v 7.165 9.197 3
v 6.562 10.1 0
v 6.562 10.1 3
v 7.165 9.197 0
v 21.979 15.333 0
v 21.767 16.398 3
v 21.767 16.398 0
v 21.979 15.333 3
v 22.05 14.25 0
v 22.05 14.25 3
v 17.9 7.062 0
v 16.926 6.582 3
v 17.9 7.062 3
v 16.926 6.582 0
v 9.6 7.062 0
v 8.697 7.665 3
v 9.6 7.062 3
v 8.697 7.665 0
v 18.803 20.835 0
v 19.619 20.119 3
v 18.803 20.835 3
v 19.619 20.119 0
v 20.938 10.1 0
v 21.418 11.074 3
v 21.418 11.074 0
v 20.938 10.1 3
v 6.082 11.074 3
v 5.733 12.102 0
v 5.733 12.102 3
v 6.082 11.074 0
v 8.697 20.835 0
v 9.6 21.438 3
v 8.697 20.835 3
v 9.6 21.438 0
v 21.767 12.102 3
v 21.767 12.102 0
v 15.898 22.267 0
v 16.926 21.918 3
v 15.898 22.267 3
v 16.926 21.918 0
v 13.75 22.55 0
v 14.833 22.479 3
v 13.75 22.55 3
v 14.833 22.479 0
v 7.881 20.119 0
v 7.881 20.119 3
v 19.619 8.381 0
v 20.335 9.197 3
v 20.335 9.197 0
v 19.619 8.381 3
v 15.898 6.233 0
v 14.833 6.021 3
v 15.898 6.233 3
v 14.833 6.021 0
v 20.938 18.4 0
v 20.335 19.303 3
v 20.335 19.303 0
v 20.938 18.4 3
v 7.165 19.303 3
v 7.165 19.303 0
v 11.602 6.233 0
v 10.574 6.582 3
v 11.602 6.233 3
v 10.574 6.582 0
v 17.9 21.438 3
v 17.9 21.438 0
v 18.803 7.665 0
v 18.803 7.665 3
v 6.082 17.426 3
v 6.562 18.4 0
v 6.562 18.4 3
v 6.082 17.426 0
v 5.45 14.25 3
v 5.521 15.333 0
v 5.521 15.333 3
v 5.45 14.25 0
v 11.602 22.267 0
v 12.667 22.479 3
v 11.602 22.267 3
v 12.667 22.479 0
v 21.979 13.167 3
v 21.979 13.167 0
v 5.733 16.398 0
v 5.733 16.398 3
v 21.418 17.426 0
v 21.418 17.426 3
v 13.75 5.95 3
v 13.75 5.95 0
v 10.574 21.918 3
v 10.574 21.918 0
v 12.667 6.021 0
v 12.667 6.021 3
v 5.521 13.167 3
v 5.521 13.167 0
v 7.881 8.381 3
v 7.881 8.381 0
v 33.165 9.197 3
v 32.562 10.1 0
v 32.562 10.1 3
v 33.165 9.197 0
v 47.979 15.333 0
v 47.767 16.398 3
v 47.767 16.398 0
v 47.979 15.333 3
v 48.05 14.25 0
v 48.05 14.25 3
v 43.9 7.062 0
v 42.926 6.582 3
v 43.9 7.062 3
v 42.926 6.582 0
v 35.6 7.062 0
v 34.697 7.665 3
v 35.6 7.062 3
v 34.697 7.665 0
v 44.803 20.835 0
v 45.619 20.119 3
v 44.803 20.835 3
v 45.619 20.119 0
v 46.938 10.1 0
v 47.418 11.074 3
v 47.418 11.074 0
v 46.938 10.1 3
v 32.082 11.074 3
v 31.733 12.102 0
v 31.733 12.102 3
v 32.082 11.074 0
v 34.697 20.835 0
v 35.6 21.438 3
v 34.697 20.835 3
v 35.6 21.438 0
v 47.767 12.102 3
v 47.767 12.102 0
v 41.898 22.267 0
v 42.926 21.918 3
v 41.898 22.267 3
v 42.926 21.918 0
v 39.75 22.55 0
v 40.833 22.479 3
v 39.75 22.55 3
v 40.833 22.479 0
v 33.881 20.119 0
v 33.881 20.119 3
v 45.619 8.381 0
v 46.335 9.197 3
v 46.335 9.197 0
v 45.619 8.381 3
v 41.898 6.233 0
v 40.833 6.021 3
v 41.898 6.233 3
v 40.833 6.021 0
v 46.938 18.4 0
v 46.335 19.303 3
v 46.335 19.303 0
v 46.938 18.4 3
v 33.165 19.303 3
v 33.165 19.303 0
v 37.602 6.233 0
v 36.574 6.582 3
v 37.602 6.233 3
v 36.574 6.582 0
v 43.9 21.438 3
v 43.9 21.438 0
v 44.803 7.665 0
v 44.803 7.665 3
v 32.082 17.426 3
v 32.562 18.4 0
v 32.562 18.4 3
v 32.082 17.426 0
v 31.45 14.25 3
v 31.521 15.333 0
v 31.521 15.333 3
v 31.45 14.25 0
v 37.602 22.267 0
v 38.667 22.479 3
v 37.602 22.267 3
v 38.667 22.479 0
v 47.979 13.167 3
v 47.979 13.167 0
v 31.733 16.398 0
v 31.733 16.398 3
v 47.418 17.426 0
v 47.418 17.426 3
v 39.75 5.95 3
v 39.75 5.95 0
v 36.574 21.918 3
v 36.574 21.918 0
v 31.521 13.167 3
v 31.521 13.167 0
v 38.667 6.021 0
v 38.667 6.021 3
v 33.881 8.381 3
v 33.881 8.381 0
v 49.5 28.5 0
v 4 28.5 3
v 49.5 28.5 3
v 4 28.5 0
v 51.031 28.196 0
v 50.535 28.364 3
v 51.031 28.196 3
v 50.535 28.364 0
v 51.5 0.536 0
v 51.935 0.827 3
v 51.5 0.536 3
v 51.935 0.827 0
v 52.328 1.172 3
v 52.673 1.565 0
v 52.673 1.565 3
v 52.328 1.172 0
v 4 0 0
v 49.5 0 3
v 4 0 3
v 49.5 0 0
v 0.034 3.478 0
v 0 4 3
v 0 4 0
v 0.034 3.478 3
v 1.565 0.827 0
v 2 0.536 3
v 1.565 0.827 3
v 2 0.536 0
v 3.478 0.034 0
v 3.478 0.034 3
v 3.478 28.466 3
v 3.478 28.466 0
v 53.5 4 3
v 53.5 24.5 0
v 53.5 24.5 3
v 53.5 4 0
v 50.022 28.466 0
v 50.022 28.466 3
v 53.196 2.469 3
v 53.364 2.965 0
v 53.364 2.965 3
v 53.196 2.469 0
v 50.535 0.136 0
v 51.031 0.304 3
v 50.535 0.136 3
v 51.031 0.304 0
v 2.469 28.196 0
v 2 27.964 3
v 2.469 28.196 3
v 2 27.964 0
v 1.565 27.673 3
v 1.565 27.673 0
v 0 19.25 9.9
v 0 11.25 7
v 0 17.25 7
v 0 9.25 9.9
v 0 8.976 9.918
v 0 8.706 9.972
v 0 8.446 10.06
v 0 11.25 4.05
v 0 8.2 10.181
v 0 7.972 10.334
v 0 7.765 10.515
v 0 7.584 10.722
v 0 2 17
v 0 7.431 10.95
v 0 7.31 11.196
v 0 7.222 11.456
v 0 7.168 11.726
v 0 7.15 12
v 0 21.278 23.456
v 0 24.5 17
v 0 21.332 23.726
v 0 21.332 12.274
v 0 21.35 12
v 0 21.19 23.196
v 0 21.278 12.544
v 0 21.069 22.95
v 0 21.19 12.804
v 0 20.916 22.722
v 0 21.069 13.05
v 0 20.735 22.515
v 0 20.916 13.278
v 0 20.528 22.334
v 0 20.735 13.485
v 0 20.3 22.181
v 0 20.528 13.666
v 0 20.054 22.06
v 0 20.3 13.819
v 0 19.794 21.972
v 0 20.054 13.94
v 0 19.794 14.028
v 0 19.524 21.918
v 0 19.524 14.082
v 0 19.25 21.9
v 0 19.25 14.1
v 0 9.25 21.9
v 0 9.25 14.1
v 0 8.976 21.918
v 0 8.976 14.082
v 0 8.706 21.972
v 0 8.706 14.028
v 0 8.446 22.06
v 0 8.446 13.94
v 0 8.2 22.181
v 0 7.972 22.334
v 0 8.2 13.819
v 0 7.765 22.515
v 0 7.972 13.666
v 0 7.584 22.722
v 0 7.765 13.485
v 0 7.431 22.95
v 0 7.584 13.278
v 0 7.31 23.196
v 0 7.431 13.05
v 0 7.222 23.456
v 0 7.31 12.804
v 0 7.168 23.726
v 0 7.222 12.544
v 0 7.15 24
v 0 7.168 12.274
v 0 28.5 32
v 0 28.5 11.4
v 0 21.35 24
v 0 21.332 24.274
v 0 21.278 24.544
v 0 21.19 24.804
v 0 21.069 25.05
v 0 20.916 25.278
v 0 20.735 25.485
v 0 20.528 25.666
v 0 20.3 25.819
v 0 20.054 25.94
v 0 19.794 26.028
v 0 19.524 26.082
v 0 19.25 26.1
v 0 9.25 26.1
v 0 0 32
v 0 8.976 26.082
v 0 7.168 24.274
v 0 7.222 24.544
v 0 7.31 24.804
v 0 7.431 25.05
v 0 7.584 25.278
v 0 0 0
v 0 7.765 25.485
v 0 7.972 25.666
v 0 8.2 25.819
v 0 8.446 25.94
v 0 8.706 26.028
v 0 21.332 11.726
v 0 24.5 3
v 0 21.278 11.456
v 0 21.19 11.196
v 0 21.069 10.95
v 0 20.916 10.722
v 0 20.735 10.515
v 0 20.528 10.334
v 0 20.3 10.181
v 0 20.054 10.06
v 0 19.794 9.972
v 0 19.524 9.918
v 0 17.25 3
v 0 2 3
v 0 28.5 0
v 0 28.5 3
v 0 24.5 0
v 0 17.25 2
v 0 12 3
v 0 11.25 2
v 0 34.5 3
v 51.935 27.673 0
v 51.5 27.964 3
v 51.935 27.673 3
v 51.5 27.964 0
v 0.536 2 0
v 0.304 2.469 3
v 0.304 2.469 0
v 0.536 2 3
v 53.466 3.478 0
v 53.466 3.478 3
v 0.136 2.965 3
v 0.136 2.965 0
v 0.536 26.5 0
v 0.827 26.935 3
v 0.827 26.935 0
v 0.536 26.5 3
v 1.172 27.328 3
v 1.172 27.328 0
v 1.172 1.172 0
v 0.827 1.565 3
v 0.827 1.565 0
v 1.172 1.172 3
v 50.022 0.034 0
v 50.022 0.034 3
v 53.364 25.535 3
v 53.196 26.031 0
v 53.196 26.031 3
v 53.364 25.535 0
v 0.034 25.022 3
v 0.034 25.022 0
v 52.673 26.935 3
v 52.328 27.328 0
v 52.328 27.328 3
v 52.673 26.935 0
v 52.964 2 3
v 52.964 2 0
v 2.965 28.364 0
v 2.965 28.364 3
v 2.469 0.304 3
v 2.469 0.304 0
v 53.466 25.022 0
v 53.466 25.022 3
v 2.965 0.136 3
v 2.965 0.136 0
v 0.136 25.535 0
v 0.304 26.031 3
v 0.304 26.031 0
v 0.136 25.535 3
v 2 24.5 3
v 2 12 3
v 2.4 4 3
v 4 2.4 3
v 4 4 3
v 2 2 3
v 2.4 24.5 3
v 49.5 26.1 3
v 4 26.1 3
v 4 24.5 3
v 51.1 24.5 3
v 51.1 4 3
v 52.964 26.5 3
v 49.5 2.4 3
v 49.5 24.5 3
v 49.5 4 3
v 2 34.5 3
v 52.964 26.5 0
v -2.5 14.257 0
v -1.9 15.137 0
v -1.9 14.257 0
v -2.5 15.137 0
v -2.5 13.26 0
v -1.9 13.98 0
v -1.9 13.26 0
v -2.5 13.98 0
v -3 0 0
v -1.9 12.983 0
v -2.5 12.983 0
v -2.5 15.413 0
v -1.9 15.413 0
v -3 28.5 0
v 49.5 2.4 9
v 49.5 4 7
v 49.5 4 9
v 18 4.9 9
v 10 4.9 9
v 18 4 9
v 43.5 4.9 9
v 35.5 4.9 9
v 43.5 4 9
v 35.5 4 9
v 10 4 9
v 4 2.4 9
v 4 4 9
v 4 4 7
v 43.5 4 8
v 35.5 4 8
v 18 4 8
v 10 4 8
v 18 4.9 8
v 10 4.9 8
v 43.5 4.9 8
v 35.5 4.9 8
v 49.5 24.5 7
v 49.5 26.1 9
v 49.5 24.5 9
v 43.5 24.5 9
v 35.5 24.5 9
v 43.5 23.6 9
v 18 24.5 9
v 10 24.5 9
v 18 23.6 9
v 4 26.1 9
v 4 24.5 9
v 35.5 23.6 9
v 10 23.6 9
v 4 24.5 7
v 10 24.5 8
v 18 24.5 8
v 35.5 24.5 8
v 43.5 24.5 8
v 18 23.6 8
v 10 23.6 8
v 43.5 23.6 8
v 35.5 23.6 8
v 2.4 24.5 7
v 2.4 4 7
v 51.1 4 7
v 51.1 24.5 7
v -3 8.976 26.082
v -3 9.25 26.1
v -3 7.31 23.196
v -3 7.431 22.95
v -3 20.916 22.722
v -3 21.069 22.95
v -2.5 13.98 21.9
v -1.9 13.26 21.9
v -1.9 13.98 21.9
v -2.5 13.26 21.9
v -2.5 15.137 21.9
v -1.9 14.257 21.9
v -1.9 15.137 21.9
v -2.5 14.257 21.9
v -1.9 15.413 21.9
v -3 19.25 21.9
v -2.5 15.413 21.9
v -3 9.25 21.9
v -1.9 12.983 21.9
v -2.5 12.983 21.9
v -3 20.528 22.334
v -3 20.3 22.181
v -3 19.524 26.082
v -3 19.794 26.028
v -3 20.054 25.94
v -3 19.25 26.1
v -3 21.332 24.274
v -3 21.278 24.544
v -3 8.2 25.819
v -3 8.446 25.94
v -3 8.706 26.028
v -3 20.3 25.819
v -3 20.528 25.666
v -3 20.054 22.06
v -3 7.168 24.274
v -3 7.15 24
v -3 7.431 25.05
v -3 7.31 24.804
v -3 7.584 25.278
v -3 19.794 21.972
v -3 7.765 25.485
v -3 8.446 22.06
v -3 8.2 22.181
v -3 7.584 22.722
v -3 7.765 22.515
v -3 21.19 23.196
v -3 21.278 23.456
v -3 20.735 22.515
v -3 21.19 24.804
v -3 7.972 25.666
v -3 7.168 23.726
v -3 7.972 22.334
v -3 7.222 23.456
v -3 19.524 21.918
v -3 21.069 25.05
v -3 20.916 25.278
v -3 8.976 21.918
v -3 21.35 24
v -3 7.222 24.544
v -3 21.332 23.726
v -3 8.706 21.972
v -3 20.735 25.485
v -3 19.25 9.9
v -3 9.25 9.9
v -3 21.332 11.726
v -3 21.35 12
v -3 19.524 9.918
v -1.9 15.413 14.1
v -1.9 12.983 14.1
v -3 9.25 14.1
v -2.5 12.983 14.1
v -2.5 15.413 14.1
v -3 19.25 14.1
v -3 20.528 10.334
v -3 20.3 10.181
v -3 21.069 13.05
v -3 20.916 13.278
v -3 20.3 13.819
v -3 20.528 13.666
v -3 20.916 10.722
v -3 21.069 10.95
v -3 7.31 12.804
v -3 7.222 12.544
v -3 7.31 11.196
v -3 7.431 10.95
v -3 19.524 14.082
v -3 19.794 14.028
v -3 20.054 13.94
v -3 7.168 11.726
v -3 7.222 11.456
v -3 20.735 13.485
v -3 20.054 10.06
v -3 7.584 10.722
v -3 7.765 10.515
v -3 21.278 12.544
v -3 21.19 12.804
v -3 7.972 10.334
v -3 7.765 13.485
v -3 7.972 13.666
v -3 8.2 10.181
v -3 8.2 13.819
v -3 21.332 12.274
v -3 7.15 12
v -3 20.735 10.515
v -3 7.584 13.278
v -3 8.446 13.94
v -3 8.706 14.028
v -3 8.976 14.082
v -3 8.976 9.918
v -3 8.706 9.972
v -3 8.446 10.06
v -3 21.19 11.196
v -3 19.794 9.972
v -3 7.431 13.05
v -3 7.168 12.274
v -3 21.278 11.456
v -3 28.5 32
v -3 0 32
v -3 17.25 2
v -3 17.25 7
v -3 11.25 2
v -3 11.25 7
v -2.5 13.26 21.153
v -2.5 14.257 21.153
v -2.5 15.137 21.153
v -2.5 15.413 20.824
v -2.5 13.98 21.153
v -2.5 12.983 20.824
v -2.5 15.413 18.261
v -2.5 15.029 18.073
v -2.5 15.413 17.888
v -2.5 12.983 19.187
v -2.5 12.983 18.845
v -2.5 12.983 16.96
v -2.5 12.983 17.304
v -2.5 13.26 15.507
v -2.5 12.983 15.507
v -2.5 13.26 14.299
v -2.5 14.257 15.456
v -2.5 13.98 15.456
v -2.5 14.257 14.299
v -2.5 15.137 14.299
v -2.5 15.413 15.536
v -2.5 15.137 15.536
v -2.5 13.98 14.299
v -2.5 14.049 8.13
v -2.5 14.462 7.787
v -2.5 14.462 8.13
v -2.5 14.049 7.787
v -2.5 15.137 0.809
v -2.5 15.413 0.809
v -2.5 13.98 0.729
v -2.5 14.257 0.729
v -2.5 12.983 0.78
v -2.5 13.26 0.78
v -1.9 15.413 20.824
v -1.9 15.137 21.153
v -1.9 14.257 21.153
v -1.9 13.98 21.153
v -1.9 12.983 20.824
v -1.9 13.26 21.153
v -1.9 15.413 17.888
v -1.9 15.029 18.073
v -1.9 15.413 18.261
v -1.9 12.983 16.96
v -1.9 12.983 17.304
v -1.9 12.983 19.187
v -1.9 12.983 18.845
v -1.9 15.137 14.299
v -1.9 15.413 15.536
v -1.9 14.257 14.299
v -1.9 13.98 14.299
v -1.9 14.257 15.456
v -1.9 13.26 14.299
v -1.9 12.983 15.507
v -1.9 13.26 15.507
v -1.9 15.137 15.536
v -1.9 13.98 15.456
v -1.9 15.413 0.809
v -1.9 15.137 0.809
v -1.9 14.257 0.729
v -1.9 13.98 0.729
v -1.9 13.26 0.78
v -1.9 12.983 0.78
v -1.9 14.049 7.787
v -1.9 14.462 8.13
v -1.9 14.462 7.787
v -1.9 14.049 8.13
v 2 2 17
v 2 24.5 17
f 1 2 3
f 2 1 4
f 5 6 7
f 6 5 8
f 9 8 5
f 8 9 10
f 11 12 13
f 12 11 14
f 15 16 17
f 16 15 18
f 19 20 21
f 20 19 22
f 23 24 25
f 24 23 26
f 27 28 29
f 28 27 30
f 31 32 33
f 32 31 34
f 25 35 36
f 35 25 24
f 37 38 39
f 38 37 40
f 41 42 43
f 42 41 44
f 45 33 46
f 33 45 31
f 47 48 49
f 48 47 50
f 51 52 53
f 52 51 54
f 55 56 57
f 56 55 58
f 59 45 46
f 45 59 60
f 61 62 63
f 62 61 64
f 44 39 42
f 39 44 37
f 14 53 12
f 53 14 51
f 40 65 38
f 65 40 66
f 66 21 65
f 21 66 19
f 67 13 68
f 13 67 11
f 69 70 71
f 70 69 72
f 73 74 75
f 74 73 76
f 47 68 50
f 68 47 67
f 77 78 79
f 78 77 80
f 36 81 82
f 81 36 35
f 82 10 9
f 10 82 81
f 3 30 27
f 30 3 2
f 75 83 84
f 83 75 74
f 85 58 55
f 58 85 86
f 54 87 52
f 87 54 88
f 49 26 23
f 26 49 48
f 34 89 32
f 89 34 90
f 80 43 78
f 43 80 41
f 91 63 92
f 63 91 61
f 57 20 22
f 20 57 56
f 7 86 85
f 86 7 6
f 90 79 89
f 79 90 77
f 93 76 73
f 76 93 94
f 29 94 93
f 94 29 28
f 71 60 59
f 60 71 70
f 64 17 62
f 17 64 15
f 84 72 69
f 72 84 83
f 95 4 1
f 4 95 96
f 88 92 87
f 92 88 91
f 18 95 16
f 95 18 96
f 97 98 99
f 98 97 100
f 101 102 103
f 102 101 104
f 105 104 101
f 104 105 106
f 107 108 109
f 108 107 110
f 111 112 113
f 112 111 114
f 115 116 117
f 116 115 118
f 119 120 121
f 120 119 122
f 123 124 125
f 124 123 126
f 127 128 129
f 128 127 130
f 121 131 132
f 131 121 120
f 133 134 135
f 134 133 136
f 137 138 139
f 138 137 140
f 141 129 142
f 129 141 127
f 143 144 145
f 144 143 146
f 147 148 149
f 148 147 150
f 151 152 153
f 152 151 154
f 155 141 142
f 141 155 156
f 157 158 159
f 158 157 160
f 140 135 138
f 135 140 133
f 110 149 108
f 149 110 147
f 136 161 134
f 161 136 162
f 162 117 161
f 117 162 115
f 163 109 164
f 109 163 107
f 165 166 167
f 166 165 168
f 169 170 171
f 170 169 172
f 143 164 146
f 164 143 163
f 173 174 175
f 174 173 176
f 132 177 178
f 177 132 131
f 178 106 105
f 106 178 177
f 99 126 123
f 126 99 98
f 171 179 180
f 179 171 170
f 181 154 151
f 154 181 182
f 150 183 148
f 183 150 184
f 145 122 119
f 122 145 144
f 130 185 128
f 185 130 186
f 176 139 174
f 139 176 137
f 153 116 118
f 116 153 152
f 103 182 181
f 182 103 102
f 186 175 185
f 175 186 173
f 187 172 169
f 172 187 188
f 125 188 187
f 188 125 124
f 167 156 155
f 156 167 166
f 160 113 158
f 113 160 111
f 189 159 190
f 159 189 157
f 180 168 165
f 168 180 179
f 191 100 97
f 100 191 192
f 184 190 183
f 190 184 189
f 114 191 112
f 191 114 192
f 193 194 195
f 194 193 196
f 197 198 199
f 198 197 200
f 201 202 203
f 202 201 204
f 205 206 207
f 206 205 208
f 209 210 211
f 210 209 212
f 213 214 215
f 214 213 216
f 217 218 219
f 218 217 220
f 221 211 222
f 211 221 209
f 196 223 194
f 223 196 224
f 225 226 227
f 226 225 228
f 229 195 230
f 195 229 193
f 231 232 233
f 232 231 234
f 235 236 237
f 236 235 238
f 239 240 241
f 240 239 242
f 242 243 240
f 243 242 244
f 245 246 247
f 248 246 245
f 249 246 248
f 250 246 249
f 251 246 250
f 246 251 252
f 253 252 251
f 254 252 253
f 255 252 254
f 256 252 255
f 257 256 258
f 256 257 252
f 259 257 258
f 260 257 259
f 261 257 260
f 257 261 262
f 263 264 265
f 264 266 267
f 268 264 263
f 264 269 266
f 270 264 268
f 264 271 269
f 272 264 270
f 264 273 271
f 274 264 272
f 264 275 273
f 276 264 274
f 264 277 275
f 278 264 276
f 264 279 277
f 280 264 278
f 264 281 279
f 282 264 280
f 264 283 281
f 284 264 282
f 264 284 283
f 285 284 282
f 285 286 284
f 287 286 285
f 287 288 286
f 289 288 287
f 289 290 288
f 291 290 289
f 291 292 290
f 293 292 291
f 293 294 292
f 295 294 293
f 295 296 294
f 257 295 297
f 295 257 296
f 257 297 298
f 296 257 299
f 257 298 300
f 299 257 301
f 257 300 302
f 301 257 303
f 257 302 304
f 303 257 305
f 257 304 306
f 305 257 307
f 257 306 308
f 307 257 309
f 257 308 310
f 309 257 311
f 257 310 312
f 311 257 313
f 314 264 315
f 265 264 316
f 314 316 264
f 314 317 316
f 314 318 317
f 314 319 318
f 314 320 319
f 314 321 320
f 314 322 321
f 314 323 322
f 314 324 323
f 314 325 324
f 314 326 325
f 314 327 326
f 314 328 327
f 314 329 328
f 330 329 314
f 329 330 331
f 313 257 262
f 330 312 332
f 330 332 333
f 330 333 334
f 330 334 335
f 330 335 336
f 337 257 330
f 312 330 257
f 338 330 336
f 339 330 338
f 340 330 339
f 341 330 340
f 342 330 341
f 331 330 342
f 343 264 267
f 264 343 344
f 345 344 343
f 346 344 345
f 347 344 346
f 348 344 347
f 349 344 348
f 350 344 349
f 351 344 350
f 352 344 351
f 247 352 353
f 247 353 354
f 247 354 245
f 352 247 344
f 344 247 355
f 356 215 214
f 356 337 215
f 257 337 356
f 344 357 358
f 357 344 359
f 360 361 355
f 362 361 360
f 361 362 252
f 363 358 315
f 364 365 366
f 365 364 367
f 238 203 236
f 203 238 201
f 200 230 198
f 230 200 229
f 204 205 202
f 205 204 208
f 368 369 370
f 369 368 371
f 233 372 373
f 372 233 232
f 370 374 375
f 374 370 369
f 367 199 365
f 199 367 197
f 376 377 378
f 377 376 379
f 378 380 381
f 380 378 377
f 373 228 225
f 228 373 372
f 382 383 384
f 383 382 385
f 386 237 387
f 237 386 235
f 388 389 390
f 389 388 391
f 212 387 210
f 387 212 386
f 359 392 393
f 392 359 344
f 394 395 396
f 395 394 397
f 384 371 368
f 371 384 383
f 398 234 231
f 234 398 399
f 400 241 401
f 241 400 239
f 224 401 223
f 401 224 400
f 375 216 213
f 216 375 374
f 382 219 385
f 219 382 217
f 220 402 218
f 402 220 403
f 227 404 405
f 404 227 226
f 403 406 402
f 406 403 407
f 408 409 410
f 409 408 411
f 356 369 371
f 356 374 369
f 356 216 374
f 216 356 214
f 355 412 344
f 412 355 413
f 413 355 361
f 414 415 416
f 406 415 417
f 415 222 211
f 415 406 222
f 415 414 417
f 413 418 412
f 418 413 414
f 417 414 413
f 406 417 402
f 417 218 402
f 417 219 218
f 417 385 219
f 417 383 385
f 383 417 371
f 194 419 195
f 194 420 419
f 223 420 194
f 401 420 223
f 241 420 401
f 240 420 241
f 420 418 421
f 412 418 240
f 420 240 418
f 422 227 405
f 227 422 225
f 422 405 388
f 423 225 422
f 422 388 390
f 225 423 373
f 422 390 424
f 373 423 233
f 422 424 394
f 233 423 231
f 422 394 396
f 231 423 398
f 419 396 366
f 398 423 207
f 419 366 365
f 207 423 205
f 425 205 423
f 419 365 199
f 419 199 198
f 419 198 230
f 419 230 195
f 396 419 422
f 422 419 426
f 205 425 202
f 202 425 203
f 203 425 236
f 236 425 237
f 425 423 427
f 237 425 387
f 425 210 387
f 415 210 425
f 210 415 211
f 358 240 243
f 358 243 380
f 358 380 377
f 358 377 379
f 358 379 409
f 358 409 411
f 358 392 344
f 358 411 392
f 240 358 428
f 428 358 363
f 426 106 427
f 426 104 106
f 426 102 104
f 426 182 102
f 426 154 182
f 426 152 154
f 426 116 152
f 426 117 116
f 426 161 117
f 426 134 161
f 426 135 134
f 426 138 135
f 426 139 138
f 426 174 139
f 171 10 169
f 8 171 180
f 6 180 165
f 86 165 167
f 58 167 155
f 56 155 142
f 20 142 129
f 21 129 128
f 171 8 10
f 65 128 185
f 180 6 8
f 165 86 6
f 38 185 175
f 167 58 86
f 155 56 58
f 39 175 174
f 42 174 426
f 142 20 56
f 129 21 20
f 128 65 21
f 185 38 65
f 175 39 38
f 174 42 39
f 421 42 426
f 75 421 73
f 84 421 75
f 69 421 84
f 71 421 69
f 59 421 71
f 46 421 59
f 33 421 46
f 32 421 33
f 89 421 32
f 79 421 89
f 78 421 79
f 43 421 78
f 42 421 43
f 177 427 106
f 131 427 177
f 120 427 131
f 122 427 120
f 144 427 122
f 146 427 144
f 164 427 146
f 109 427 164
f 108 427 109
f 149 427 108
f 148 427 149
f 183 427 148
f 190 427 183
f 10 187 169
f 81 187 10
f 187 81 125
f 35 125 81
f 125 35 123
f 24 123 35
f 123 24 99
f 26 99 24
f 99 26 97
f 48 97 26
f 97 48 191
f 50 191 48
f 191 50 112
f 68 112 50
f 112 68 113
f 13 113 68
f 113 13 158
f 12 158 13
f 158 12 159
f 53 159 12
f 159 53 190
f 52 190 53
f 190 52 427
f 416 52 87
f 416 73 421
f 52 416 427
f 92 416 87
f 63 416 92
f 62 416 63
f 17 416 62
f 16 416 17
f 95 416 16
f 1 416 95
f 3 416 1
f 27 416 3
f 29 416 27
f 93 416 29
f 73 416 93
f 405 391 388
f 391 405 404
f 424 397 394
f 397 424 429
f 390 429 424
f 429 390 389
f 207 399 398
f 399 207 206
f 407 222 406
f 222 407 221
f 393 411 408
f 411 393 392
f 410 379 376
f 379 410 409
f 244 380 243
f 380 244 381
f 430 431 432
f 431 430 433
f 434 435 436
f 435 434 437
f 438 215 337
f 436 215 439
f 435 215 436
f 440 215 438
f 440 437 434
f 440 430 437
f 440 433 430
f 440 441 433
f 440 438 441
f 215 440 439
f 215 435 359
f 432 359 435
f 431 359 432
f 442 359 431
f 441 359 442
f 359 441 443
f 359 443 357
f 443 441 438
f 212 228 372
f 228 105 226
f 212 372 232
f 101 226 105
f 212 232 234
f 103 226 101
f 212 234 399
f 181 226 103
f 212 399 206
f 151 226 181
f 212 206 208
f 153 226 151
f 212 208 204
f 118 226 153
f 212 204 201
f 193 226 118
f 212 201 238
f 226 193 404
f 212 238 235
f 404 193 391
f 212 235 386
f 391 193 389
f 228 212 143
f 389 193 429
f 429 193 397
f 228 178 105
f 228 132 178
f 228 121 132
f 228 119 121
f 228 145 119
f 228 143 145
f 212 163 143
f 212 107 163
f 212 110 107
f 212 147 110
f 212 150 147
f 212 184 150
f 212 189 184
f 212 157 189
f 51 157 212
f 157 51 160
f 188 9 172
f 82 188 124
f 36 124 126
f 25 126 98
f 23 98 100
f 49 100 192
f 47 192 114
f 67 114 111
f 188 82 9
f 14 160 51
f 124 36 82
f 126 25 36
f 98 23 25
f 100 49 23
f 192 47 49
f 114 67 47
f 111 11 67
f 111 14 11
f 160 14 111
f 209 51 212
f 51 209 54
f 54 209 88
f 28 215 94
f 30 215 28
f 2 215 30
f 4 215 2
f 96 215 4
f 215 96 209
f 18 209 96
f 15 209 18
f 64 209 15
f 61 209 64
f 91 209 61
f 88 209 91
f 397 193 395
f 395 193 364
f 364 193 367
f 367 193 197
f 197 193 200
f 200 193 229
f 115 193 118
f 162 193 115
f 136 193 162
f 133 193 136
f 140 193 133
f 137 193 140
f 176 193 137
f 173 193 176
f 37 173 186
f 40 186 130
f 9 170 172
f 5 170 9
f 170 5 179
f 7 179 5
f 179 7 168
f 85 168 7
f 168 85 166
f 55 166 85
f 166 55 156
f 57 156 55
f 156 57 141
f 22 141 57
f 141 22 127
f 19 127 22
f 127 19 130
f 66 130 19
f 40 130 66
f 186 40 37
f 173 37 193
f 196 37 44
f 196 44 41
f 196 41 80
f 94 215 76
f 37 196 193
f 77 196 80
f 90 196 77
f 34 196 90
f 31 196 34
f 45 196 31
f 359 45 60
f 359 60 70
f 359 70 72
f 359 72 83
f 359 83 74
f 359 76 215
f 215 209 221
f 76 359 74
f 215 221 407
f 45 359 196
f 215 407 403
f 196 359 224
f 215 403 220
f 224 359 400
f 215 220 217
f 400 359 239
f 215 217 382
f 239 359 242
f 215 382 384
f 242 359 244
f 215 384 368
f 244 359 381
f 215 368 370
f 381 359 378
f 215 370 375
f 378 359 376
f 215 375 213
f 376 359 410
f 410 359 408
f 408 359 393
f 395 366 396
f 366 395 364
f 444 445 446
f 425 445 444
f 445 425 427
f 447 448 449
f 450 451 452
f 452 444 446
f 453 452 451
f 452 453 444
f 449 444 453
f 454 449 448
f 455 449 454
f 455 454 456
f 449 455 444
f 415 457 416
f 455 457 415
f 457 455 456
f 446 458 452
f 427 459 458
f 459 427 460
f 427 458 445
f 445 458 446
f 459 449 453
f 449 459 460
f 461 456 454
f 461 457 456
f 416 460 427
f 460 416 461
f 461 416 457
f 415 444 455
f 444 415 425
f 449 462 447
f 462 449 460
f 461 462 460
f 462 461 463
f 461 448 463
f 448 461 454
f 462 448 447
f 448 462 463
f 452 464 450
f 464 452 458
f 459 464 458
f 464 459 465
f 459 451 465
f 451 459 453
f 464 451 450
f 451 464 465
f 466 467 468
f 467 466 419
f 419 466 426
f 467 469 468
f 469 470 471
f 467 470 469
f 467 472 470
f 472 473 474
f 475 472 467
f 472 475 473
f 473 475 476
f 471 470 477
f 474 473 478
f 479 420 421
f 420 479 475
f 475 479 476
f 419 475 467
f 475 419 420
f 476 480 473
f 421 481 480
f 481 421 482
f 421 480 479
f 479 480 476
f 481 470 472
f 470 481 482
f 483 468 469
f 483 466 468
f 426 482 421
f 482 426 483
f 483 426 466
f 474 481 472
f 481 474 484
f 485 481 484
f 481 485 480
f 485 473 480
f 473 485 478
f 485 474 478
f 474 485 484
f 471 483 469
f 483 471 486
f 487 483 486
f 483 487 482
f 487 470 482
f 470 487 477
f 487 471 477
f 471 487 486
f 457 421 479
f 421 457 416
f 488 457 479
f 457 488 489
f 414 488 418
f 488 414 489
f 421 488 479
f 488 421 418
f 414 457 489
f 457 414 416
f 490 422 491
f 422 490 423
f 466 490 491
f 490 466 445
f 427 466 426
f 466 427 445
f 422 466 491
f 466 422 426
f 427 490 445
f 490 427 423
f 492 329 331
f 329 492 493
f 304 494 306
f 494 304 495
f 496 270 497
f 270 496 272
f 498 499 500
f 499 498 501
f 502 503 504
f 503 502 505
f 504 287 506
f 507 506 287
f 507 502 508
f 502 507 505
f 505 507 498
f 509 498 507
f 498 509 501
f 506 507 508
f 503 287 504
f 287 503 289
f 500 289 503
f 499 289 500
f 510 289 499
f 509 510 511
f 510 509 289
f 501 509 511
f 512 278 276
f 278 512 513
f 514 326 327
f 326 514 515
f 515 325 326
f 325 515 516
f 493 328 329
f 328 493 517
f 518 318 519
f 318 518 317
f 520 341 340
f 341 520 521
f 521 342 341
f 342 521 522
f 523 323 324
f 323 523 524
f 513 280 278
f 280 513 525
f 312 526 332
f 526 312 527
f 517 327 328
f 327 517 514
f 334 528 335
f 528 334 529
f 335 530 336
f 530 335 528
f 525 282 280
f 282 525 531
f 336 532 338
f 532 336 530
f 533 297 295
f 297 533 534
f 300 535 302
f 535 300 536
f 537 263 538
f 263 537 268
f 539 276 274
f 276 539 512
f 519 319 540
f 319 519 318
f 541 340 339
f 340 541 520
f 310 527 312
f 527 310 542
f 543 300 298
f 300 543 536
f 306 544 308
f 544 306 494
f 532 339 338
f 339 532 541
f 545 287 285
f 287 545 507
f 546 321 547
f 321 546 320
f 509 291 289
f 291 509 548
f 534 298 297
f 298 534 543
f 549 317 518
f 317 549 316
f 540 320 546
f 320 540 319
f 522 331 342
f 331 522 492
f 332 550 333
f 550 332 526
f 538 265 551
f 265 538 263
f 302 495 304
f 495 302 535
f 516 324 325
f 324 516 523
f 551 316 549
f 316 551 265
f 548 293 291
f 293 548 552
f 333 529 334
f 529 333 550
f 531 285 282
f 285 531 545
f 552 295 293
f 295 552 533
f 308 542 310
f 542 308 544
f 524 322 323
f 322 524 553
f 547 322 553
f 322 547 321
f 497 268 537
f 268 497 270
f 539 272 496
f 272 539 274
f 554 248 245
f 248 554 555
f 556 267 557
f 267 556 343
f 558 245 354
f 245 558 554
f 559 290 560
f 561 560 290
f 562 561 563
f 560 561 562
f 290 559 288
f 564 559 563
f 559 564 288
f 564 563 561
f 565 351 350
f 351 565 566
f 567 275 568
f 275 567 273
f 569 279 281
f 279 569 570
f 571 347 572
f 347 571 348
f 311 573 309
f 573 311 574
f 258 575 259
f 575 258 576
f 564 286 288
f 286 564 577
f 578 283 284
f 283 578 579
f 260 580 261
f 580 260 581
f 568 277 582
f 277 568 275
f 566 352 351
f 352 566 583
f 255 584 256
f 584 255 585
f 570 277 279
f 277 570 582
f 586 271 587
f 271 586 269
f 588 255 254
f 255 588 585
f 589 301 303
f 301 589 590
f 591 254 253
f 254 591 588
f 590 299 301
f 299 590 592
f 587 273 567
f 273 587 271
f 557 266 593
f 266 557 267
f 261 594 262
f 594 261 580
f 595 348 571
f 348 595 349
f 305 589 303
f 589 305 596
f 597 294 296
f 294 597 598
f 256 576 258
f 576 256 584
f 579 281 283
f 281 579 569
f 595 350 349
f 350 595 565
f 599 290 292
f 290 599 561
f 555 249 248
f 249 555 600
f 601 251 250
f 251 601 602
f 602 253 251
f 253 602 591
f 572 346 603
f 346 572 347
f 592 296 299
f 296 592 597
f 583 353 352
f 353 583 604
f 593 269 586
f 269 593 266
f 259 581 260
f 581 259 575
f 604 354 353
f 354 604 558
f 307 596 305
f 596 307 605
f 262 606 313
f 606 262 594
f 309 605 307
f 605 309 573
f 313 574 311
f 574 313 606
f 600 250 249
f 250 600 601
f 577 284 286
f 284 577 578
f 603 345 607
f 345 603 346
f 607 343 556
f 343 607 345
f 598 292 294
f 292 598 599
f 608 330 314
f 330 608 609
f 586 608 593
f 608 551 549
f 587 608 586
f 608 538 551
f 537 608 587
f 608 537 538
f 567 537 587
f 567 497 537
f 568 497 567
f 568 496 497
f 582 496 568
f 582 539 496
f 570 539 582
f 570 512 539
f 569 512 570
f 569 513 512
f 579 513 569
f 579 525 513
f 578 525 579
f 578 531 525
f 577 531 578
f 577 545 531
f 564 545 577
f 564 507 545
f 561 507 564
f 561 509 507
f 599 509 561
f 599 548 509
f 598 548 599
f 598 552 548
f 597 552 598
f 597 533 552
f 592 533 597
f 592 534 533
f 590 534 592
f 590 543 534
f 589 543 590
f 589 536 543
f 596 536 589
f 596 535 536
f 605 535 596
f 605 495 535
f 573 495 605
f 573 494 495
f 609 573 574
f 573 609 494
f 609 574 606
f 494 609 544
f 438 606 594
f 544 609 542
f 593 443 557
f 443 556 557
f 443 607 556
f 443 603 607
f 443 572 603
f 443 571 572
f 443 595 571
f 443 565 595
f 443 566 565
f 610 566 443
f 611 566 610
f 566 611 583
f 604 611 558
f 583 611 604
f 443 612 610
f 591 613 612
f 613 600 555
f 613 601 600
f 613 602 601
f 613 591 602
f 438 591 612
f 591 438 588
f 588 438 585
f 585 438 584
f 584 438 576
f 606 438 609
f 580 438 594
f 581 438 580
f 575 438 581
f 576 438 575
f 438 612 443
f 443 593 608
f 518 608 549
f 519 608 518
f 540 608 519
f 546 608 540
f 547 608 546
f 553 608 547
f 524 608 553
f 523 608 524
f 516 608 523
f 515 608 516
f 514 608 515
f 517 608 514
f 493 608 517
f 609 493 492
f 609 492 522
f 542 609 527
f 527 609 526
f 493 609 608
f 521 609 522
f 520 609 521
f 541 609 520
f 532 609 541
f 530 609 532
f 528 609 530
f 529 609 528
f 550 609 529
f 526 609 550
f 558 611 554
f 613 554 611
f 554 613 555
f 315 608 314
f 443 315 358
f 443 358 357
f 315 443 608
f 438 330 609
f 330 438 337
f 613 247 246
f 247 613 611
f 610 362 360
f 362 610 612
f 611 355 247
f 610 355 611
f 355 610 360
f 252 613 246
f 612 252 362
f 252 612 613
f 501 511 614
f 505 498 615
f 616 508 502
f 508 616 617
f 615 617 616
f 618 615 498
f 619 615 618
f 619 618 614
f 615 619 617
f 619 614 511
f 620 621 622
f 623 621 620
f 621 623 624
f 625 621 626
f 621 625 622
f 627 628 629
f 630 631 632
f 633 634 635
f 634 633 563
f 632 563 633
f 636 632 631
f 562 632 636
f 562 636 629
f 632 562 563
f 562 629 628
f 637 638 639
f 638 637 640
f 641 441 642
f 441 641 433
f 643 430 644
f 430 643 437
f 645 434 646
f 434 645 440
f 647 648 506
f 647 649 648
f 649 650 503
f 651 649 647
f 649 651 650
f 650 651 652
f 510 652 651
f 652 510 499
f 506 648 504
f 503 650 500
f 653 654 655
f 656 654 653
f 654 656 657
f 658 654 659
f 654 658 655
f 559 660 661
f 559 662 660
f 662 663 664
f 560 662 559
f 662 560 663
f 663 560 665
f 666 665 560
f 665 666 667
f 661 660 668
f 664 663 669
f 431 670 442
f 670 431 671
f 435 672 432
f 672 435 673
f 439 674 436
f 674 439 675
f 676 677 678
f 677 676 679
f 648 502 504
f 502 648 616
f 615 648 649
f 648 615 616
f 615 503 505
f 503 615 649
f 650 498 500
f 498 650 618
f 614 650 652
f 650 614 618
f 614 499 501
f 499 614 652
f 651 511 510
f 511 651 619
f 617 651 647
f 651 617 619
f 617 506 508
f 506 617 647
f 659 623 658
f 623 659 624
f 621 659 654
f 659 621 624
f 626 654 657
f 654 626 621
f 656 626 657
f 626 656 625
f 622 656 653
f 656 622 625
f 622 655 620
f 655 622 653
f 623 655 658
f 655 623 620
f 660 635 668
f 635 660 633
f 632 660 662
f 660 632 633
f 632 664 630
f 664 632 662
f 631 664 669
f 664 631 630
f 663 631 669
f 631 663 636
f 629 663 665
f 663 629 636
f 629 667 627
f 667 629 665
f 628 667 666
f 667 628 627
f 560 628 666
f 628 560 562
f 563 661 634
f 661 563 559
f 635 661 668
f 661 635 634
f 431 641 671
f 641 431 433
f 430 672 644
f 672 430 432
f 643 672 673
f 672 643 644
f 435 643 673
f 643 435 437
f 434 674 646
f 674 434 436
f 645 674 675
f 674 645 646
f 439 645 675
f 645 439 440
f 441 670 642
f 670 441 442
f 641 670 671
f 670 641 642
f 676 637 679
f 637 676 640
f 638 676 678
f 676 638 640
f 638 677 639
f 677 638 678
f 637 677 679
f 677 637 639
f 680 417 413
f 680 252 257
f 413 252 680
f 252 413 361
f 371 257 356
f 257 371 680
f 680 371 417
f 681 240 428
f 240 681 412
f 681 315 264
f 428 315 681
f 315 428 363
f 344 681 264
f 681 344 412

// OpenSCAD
// ============================================================
//  FLX-LEVEL-1 — the tank level bracket (Rev A)
//  FULNEX · aims an HY-SRF05 / HC-SR04 ultrasonic sensor straight
//  down into a water tank. The two transducer barrels drop through
//  the deck holes; side clips grip the board; the flange screws to
//  the tank lid or rim through two slots (slots forgive sloppy
//  drilling). Cable leaves through the flange notch.
//
//  Print flange-down as modelled — no supports.
// ============================================================

board_l = 45.5;       // sensor board (+ tolerance)
board_w = 20.5;
barrel_d = 16.6;      // transducer barrels
barrel_cc = 26;       // centre-to-centre

PT = 3;               // plate thickness
lip = 6;              // clip walls height
FH = 32;              // flange height
FT = 3;

$fn = 48;

module bracket() {
  deck_l = board_l + 8;
  deck_w = board_w + 8;

  // ---- deck: the sensor faces down through it ----
  difference() {
    hull()
      for (x = [4, deck_l - 4], y = [4, deck_w - 4])
        translate([x, y]) cylinder(r = 4, h = PT);
    for (s = [-1, 1])
      translate([deck_l/2 + s * barrel_cc/2, deck_w/2, -0.1])
        cylinder(d = barrel_d, h = PT + 1);
  }
  // board clip walls with inward lips
  for (y = [4 - 2, deck_w - 4 + 0.0]) ;
  for (s = [0, 1]) {
    ys = s == 0 ? (deck_w - board_w)/2 - 1.6 : (deck_w + board_w)/2;
    translate([(deck_l - board_l)/2, ys, PT]) cube([board_l, 1.6, lip]);
    translate([(deck_l - board_l)/2 + 6, s == 0 ? ys + 1.5 : ys - 0.9, PT + lip - 1])
      cube([8, 1, 1]);
    translate([(deck_l - board_l)/2 + board_l - 14, s == 0 ? ys + 1.5 : ys - 0.9, PT + lip - 1])
      cube([8, 1, 1]);
  }
  // end stops
  for (x = [(deck_l - board_l)/2 - 1.6, (deck_l + board_l)/2])
    translate([x, (deck_w - board_w)/2, PT]) cube([1.6, board_w, lip - 2]);

  // ---- flange: vertical, screws to the tank ----
  difference() {
    translate([-FT, 0, 0]) cube([FT, deck_w, FH]);
    // two screw slots
    for (z = [FH - 8, FH - 20])
      hull() {
        translate([-FT - 0.1, deck_w/2 - 5, z]) rotate([0, 90, 0]) cylinder(d = 4.2, h = FT + 1);
        translate([-FT - 0.1, deck_w/2 + 5, z]) rotate([0, 90, 0]) cylinder(d = 4.2, h = FT + 1);
      }
    // cable notch at the deck junction
    translate([-FT - 0.1, deck_w/2 - 3, 2]) cube([FT + 1, 6, 5]);
    // identity
    translate([-FT + 0.5, deck_w/2, FH - 26])
      rotate([90, -90, 90]) linear_extrude(0.6)
        text("FULNEX · LEVEL", size = 2.4, font = "Michroma",
             halign = "center", valign = "center", spacing = 1.6);
  }
  // gusset ribs
  for (y = [2, deck_w - 4])
    translate([0, y, PT])
      rotate([90, 0, 90]) linear_extrude(2) polygon([[0, 0], [10, 0], [0, 14]]);
}

bracket();
